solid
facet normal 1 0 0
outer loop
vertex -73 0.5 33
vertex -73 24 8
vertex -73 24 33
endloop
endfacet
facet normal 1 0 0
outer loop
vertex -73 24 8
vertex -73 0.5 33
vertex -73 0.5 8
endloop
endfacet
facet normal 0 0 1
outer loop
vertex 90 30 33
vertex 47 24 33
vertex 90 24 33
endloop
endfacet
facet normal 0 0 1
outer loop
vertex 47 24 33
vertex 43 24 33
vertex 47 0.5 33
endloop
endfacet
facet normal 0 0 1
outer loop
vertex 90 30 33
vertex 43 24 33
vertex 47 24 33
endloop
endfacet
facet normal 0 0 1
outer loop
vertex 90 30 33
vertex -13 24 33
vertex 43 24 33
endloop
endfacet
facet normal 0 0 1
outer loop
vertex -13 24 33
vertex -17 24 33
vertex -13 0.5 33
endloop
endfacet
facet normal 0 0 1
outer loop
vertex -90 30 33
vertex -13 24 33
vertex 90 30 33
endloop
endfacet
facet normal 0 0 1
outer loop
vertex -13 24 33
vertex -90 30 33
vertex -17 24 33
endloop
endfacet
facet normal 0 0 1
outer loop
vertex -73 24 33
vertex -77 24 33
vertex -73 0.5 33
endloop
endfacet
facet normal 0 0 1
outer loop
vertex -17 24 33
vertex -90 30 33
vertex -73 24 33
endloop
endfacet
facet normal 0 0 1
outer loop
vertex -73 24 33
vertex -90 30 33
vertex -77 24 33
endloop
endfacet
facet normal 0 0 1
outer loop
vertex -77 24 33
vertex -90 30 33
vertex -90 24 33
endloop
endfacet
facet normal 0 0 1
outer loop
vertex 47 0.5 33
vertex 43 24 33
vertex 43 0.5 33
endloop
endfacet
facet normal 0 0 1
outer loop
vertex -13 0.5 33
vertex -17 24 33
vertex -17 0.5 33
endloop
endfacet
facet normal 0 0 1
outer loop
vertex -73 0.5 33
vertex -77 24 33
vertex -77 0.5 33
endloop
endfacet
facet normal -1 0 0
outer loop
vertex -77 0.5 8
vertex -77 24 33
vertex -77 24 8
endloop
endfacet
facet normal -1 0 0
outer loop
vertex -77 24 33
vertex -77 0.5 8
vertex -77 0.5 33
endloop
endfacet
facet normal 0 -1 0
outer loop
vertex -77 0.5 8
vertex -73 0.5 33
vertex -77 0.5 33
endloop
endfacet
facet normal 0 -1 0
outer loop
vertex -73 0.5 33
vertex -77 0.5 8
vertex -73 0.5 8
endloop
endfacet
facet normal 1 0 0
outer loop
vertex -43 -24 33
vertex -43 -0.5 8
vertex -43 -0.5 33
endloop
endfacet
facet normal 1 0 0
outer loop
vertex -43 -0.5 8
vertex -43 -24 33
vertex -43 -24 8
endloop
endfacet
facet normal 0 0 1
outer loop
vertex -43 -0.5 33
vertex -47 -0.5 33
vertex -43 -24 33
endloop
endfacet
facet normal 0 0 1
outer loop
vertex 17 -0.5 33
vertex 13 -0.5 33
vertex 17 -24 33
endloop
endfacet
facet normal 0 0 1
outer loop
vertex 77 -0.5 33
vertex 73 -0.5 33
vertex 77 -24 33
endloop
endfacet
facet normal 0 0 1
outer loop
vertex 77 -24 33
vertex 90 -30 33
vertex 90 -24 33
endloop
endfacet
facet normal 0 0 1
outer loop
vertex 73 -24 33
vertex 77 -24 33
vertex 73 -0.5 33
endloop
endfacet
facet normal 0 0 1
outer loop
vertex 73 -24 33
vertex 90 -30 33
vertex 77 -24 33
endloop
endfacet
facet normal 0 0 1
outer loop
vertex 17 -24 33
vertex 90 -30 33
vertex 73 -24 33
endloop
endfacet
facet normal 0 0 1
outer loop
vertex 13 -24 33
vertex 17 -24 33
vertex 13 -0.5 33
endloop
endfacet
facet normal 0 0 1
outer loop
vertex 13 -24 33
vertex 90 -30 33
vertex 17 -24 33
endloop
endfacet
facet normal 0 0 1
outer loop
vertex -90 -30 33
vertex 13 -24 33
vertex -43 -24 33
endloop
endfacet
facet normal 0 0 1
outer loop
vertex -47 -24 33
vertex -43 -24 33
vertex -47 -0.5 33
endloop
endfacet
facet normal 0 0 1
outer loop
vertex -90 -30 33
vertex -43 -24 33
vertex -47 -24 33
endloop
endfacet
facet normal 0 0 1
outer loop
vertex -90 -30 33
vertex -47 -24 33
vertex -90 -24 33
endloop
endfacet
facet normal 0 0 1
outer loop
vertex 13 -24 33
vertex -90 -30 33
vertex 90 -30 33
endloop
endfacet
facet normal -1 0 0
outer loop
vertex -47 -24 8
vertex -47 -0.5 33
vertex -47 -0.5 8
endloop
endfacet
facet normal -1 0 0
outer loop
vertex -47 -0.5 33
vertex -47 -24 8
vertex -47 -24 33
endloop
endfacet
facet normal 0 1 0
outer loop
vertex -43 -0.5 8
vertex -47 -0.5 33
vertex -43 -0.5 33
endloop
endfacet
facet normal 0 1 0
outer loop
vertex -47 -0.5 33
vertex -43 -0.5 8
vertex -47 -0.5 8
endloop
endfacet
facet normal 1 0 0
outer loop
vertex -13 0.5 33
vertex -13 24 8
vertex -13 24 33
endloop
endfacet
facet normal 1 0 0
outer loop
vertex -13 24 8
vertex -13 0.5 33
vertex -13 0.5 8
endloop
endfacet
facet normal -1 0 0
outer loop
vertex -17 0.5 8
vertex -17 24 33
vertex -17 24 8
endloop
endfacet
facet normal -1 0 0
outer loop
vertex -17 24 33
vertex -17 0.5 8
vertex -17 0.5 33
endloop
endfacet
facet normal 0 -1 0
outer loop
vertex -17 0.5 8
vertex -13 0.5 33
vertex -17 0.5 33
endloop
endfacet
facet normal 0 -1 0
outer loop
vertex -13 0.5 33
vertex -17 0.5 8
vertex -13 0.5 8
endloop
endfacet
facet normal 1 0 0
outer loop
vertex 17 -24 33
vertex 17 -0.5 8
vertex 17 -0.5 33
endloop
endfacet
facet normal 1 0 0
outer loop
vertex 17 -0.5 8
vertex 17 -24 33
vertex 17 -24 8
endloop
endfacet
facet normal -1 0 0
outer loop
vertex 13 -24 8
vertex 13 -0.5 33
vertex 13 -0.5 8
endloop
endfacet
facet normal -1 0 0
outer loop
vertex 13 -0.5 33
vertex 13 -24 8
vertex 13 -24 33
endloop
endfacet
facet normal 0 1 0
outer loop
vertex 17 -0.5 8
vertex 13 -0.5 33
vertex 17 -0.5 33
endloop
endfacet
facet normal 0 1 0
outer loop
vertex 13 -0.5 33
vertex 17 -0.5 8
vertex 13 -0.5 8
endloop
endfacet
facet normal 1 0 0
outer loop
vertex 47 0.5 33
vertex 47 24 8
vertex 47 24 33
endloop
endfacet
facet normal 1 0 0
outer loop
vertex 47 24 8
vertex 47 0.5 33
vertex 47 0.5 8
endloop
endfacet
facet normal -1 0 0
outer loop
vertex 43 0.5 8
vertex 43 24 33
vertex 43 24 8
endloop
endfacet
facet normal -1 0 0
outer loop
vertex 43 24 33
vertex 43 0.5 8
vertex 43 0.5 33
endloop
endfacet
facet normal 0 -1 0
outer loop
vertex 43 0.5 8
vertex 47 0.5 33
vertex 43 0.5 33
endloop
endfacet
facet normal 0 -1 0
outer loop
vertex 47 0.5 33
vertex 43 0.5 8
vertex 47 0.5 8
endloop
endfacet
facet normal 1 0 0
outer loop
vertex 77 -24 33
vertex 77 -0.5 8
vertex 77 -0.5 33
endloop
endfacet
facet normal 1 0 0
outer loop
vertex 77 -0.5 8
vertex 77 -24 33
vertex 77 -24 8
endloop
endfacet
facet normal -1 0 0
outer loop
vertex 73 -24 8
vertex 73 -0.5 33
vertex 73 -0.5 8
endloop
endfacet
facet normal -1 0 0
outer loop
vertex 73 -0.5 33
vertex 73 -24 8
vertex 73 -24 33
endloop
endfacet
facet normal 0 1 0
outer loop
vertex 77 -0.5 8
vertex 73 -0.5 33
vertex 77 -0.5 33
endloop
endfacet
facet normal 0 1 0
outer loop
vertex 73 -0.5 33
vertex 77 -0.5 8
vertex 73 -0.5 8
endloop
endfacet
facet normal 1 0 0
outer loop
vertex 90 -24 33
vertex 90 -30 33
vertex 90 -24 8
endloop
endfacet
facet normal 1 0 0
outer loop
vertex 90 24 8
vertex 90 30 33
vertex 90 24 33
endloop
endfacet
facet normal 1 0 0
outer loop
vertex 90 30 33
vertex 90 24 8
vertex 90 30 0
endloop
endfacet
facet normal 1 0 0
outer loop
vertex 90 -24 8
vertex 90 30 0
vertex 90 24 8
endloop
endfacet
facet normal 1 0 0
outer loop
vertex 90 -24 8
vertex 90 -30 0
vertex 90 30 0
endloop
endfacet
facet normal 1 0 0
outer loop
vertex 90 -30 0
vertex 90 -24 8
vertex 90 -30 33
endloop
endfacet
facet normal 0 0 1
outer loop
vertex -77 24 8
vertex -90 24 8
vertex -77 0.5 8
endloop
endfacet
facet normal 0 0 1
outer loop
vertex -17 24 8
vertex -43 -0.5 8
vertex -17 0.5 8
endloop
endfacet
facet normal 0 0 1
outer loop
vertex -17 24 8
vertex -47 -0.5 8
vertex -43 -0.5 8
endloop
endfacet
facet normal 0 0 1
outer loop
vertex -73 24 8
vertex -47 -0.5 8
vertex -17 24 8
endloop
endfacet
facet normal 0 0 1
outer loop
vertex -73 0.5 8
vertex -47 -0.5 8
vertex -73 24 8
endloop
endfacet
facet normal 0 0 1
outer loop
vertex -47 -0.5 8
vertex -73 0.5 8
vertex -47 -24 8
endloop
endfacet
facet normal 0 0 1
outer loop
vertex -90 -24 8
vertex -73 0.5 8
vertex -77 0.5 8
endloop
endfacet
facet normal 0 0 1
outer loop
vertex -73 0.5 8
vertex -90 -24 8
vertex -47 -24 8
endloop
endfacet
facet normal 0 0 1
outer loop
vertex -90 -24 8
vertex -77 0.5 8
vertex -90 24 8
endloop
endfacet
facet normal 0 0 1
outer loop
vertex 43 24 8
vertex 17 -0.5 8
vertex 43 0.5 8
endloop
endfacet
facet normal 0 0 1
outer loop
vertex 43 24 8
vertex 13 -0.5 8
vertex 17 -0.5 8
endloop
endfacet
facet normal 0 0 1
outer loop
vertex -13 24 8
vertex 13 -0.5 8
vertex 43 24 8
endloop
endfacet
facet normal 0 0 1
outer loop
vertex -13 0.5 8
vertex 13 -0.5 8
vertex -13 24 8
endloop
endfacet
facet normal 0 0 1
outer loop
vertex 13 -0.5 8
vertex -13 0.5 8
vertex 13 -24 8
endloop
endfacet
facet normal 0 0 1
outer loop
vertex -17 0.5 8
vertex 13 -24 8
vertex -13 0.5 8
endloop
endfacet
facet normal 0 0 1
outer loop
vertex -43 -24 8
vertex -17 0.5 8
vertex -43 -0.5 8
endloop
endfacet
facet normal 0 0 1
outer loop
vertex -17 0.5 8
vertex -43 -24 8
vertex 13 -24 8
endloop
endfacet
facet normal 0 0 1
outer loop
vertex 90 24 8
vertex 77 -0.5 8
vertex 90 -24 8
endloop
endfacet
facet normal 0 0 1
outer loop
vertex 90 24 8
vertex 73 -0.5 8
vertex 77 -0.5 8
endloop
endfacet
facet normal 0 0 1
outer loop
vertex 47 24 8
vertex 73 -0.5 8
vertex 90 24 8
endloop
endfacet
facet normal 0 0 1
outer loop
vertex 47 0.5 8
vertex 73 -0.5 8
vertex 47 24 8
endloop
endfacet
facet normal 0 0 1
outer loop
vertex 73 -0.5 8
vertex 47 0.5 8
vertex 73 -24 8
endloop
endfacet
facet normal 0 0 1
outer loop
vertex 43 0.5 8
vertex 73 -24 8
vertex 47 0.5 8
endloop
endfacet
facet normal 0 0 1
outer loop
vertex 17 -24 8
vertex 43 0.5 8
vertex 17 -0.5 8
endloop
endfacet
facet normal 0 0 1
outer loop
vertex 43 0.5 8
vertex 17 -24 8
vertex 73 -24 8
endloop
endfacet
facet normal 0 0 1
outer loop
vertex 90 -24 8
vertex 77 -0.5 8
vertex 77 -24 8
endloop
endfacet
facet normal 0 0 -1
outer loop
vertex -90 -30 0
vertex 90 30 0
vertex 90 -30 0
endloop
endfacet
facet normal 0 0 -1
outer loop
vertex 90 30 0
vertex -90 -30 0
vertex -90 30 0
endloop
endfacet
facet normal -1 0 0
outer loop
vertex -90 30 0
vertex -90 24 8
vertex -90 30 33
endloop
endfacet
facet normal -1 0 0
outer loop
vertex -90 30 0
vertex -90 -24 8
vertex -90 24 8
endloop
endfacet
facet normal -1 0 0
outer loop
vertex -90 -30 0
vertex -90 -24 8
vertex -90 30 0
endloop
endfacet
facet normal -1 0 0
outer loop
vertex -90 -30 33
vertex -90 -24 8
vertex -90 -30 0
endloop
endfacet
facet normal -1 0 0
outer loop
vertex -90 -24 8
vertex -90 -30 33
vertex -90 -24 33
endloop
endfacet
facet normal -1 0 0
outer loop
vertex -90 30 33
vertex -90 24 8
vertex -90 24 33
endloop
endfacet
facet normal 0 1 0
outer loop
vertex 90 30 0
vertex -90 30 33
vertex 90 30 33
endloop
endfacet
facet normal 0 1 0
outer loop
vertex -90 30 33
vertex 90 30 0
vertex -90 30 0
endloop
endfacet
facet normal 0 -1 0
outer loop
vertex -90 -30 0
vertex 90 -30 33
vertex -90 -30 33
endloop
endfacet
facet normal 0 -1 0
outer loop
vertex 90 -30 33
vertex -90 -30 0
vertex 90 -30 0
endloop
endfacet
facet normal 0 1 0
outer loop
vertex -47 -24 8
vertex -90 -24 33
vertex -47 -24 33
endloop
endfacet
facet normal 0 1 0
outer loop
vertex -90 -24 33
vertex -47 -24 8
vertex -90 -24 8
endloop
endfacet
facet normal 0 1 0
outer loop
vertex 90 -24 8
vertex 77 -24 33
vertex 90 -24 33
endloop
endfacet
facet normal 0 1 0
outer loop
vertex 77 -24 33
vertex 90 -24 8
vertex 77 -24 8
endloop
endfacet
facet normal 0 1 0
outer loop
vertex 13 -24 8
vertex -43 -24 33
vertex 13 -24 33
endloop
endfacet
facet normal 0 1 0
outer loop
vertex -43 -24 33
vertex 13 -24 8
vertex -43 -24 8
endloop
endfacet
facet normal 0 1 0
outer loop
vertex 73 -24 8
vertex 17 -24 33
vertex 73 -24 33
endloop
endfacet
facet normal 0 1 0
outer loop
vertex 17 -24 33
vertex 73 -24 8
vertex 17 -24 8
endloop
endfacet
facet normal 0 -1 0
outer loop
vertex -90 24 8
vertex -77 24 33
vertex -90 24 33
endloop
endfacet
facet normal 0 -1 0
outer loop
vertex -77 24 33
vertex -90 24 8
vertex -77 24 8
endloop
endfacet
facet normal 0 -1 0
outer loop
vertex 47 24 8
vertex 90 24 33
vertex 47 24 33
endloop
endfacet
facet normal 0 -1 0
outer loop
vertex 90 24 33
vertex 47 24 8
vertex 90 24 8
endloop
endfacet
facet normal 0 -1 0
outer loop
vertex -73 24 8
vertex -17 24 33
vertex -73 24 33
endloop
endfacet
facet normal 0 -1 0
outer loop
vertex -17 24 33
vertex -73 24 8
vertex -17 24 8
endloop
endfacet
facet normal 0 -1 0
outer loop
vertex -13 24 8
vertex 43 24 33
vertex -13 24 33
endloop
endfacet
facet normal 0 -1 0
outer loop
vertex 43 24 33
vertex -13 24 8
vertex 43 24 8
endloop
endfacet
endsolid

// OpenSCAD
$fn = 32;

// ----------------------------------------------------------------------
// Rib frame 180 x 60 x 33
// 6 ribs at 30 mm pitch, staggered
// ----------------------------------------------------------------------

// --- parameters (mm) ---
frame = [180, 60, 8];  // base plate size (x, y, z)
rail_w = 6;            // side rail width
ribs = 6;              // number of ribs
rib_t = 4;             // rib thickness
rib_h = 25;            // rib height above the base plate
pitch = 30;            // pitch between rib centres

// --- derived feature positions (mm) ---
span = (ribs - 1) * pitch;          // = 150   distance between the outer ribs
origin_x = -span / 2;               // = -75   X of the first rib
rib_len = frame[1] / 2 - rail_w + 0.5;  // = 24.5   length of a staggered rib
rib_y = 0.5 + rib_len / 2;          // = 12.75   Y of a staggered rib centre
row_offset = 2 * rib_y;             // = 25.5   distance between the two rows
feature_centers = [
  [origin_x + 0 * pitch, rib_y],
  [origin_x + 1 * pitch, -rib_y],
  [origin_x + 2 * pitch, rib_y],
  [origin_x + 3 * pitch, -rib_y],
  [origin_x + 4 * pitch, rib_y],
  [origin_x + 5 * pitch, -rib_y]
];   // rib centre line, drives the rib loop

// base plate, two side rails, then the ribs read straight off feature_centers
union() {
  translate([-frame[0] / 2, -frame[1] / 2, 0]) cube(frame);
  translate([-frame[0] / 2, -frame[1] / 2, 0]) cube([frame[0], rail_w, frame[2] + rib_h]);
  translate([-frame[0] / 2, frame[1] / 2 - rail_w, 0]) cube([frame[0], rail_w, frame[2] + rib_h]);
  for (centre = feature_centers)
    translate([centre[0] - rib_t / 2, centre[1] - rib_len / 2, frame[2] - 1])
      cube([rib_t, rib_len, rib_h + 1]);
}
